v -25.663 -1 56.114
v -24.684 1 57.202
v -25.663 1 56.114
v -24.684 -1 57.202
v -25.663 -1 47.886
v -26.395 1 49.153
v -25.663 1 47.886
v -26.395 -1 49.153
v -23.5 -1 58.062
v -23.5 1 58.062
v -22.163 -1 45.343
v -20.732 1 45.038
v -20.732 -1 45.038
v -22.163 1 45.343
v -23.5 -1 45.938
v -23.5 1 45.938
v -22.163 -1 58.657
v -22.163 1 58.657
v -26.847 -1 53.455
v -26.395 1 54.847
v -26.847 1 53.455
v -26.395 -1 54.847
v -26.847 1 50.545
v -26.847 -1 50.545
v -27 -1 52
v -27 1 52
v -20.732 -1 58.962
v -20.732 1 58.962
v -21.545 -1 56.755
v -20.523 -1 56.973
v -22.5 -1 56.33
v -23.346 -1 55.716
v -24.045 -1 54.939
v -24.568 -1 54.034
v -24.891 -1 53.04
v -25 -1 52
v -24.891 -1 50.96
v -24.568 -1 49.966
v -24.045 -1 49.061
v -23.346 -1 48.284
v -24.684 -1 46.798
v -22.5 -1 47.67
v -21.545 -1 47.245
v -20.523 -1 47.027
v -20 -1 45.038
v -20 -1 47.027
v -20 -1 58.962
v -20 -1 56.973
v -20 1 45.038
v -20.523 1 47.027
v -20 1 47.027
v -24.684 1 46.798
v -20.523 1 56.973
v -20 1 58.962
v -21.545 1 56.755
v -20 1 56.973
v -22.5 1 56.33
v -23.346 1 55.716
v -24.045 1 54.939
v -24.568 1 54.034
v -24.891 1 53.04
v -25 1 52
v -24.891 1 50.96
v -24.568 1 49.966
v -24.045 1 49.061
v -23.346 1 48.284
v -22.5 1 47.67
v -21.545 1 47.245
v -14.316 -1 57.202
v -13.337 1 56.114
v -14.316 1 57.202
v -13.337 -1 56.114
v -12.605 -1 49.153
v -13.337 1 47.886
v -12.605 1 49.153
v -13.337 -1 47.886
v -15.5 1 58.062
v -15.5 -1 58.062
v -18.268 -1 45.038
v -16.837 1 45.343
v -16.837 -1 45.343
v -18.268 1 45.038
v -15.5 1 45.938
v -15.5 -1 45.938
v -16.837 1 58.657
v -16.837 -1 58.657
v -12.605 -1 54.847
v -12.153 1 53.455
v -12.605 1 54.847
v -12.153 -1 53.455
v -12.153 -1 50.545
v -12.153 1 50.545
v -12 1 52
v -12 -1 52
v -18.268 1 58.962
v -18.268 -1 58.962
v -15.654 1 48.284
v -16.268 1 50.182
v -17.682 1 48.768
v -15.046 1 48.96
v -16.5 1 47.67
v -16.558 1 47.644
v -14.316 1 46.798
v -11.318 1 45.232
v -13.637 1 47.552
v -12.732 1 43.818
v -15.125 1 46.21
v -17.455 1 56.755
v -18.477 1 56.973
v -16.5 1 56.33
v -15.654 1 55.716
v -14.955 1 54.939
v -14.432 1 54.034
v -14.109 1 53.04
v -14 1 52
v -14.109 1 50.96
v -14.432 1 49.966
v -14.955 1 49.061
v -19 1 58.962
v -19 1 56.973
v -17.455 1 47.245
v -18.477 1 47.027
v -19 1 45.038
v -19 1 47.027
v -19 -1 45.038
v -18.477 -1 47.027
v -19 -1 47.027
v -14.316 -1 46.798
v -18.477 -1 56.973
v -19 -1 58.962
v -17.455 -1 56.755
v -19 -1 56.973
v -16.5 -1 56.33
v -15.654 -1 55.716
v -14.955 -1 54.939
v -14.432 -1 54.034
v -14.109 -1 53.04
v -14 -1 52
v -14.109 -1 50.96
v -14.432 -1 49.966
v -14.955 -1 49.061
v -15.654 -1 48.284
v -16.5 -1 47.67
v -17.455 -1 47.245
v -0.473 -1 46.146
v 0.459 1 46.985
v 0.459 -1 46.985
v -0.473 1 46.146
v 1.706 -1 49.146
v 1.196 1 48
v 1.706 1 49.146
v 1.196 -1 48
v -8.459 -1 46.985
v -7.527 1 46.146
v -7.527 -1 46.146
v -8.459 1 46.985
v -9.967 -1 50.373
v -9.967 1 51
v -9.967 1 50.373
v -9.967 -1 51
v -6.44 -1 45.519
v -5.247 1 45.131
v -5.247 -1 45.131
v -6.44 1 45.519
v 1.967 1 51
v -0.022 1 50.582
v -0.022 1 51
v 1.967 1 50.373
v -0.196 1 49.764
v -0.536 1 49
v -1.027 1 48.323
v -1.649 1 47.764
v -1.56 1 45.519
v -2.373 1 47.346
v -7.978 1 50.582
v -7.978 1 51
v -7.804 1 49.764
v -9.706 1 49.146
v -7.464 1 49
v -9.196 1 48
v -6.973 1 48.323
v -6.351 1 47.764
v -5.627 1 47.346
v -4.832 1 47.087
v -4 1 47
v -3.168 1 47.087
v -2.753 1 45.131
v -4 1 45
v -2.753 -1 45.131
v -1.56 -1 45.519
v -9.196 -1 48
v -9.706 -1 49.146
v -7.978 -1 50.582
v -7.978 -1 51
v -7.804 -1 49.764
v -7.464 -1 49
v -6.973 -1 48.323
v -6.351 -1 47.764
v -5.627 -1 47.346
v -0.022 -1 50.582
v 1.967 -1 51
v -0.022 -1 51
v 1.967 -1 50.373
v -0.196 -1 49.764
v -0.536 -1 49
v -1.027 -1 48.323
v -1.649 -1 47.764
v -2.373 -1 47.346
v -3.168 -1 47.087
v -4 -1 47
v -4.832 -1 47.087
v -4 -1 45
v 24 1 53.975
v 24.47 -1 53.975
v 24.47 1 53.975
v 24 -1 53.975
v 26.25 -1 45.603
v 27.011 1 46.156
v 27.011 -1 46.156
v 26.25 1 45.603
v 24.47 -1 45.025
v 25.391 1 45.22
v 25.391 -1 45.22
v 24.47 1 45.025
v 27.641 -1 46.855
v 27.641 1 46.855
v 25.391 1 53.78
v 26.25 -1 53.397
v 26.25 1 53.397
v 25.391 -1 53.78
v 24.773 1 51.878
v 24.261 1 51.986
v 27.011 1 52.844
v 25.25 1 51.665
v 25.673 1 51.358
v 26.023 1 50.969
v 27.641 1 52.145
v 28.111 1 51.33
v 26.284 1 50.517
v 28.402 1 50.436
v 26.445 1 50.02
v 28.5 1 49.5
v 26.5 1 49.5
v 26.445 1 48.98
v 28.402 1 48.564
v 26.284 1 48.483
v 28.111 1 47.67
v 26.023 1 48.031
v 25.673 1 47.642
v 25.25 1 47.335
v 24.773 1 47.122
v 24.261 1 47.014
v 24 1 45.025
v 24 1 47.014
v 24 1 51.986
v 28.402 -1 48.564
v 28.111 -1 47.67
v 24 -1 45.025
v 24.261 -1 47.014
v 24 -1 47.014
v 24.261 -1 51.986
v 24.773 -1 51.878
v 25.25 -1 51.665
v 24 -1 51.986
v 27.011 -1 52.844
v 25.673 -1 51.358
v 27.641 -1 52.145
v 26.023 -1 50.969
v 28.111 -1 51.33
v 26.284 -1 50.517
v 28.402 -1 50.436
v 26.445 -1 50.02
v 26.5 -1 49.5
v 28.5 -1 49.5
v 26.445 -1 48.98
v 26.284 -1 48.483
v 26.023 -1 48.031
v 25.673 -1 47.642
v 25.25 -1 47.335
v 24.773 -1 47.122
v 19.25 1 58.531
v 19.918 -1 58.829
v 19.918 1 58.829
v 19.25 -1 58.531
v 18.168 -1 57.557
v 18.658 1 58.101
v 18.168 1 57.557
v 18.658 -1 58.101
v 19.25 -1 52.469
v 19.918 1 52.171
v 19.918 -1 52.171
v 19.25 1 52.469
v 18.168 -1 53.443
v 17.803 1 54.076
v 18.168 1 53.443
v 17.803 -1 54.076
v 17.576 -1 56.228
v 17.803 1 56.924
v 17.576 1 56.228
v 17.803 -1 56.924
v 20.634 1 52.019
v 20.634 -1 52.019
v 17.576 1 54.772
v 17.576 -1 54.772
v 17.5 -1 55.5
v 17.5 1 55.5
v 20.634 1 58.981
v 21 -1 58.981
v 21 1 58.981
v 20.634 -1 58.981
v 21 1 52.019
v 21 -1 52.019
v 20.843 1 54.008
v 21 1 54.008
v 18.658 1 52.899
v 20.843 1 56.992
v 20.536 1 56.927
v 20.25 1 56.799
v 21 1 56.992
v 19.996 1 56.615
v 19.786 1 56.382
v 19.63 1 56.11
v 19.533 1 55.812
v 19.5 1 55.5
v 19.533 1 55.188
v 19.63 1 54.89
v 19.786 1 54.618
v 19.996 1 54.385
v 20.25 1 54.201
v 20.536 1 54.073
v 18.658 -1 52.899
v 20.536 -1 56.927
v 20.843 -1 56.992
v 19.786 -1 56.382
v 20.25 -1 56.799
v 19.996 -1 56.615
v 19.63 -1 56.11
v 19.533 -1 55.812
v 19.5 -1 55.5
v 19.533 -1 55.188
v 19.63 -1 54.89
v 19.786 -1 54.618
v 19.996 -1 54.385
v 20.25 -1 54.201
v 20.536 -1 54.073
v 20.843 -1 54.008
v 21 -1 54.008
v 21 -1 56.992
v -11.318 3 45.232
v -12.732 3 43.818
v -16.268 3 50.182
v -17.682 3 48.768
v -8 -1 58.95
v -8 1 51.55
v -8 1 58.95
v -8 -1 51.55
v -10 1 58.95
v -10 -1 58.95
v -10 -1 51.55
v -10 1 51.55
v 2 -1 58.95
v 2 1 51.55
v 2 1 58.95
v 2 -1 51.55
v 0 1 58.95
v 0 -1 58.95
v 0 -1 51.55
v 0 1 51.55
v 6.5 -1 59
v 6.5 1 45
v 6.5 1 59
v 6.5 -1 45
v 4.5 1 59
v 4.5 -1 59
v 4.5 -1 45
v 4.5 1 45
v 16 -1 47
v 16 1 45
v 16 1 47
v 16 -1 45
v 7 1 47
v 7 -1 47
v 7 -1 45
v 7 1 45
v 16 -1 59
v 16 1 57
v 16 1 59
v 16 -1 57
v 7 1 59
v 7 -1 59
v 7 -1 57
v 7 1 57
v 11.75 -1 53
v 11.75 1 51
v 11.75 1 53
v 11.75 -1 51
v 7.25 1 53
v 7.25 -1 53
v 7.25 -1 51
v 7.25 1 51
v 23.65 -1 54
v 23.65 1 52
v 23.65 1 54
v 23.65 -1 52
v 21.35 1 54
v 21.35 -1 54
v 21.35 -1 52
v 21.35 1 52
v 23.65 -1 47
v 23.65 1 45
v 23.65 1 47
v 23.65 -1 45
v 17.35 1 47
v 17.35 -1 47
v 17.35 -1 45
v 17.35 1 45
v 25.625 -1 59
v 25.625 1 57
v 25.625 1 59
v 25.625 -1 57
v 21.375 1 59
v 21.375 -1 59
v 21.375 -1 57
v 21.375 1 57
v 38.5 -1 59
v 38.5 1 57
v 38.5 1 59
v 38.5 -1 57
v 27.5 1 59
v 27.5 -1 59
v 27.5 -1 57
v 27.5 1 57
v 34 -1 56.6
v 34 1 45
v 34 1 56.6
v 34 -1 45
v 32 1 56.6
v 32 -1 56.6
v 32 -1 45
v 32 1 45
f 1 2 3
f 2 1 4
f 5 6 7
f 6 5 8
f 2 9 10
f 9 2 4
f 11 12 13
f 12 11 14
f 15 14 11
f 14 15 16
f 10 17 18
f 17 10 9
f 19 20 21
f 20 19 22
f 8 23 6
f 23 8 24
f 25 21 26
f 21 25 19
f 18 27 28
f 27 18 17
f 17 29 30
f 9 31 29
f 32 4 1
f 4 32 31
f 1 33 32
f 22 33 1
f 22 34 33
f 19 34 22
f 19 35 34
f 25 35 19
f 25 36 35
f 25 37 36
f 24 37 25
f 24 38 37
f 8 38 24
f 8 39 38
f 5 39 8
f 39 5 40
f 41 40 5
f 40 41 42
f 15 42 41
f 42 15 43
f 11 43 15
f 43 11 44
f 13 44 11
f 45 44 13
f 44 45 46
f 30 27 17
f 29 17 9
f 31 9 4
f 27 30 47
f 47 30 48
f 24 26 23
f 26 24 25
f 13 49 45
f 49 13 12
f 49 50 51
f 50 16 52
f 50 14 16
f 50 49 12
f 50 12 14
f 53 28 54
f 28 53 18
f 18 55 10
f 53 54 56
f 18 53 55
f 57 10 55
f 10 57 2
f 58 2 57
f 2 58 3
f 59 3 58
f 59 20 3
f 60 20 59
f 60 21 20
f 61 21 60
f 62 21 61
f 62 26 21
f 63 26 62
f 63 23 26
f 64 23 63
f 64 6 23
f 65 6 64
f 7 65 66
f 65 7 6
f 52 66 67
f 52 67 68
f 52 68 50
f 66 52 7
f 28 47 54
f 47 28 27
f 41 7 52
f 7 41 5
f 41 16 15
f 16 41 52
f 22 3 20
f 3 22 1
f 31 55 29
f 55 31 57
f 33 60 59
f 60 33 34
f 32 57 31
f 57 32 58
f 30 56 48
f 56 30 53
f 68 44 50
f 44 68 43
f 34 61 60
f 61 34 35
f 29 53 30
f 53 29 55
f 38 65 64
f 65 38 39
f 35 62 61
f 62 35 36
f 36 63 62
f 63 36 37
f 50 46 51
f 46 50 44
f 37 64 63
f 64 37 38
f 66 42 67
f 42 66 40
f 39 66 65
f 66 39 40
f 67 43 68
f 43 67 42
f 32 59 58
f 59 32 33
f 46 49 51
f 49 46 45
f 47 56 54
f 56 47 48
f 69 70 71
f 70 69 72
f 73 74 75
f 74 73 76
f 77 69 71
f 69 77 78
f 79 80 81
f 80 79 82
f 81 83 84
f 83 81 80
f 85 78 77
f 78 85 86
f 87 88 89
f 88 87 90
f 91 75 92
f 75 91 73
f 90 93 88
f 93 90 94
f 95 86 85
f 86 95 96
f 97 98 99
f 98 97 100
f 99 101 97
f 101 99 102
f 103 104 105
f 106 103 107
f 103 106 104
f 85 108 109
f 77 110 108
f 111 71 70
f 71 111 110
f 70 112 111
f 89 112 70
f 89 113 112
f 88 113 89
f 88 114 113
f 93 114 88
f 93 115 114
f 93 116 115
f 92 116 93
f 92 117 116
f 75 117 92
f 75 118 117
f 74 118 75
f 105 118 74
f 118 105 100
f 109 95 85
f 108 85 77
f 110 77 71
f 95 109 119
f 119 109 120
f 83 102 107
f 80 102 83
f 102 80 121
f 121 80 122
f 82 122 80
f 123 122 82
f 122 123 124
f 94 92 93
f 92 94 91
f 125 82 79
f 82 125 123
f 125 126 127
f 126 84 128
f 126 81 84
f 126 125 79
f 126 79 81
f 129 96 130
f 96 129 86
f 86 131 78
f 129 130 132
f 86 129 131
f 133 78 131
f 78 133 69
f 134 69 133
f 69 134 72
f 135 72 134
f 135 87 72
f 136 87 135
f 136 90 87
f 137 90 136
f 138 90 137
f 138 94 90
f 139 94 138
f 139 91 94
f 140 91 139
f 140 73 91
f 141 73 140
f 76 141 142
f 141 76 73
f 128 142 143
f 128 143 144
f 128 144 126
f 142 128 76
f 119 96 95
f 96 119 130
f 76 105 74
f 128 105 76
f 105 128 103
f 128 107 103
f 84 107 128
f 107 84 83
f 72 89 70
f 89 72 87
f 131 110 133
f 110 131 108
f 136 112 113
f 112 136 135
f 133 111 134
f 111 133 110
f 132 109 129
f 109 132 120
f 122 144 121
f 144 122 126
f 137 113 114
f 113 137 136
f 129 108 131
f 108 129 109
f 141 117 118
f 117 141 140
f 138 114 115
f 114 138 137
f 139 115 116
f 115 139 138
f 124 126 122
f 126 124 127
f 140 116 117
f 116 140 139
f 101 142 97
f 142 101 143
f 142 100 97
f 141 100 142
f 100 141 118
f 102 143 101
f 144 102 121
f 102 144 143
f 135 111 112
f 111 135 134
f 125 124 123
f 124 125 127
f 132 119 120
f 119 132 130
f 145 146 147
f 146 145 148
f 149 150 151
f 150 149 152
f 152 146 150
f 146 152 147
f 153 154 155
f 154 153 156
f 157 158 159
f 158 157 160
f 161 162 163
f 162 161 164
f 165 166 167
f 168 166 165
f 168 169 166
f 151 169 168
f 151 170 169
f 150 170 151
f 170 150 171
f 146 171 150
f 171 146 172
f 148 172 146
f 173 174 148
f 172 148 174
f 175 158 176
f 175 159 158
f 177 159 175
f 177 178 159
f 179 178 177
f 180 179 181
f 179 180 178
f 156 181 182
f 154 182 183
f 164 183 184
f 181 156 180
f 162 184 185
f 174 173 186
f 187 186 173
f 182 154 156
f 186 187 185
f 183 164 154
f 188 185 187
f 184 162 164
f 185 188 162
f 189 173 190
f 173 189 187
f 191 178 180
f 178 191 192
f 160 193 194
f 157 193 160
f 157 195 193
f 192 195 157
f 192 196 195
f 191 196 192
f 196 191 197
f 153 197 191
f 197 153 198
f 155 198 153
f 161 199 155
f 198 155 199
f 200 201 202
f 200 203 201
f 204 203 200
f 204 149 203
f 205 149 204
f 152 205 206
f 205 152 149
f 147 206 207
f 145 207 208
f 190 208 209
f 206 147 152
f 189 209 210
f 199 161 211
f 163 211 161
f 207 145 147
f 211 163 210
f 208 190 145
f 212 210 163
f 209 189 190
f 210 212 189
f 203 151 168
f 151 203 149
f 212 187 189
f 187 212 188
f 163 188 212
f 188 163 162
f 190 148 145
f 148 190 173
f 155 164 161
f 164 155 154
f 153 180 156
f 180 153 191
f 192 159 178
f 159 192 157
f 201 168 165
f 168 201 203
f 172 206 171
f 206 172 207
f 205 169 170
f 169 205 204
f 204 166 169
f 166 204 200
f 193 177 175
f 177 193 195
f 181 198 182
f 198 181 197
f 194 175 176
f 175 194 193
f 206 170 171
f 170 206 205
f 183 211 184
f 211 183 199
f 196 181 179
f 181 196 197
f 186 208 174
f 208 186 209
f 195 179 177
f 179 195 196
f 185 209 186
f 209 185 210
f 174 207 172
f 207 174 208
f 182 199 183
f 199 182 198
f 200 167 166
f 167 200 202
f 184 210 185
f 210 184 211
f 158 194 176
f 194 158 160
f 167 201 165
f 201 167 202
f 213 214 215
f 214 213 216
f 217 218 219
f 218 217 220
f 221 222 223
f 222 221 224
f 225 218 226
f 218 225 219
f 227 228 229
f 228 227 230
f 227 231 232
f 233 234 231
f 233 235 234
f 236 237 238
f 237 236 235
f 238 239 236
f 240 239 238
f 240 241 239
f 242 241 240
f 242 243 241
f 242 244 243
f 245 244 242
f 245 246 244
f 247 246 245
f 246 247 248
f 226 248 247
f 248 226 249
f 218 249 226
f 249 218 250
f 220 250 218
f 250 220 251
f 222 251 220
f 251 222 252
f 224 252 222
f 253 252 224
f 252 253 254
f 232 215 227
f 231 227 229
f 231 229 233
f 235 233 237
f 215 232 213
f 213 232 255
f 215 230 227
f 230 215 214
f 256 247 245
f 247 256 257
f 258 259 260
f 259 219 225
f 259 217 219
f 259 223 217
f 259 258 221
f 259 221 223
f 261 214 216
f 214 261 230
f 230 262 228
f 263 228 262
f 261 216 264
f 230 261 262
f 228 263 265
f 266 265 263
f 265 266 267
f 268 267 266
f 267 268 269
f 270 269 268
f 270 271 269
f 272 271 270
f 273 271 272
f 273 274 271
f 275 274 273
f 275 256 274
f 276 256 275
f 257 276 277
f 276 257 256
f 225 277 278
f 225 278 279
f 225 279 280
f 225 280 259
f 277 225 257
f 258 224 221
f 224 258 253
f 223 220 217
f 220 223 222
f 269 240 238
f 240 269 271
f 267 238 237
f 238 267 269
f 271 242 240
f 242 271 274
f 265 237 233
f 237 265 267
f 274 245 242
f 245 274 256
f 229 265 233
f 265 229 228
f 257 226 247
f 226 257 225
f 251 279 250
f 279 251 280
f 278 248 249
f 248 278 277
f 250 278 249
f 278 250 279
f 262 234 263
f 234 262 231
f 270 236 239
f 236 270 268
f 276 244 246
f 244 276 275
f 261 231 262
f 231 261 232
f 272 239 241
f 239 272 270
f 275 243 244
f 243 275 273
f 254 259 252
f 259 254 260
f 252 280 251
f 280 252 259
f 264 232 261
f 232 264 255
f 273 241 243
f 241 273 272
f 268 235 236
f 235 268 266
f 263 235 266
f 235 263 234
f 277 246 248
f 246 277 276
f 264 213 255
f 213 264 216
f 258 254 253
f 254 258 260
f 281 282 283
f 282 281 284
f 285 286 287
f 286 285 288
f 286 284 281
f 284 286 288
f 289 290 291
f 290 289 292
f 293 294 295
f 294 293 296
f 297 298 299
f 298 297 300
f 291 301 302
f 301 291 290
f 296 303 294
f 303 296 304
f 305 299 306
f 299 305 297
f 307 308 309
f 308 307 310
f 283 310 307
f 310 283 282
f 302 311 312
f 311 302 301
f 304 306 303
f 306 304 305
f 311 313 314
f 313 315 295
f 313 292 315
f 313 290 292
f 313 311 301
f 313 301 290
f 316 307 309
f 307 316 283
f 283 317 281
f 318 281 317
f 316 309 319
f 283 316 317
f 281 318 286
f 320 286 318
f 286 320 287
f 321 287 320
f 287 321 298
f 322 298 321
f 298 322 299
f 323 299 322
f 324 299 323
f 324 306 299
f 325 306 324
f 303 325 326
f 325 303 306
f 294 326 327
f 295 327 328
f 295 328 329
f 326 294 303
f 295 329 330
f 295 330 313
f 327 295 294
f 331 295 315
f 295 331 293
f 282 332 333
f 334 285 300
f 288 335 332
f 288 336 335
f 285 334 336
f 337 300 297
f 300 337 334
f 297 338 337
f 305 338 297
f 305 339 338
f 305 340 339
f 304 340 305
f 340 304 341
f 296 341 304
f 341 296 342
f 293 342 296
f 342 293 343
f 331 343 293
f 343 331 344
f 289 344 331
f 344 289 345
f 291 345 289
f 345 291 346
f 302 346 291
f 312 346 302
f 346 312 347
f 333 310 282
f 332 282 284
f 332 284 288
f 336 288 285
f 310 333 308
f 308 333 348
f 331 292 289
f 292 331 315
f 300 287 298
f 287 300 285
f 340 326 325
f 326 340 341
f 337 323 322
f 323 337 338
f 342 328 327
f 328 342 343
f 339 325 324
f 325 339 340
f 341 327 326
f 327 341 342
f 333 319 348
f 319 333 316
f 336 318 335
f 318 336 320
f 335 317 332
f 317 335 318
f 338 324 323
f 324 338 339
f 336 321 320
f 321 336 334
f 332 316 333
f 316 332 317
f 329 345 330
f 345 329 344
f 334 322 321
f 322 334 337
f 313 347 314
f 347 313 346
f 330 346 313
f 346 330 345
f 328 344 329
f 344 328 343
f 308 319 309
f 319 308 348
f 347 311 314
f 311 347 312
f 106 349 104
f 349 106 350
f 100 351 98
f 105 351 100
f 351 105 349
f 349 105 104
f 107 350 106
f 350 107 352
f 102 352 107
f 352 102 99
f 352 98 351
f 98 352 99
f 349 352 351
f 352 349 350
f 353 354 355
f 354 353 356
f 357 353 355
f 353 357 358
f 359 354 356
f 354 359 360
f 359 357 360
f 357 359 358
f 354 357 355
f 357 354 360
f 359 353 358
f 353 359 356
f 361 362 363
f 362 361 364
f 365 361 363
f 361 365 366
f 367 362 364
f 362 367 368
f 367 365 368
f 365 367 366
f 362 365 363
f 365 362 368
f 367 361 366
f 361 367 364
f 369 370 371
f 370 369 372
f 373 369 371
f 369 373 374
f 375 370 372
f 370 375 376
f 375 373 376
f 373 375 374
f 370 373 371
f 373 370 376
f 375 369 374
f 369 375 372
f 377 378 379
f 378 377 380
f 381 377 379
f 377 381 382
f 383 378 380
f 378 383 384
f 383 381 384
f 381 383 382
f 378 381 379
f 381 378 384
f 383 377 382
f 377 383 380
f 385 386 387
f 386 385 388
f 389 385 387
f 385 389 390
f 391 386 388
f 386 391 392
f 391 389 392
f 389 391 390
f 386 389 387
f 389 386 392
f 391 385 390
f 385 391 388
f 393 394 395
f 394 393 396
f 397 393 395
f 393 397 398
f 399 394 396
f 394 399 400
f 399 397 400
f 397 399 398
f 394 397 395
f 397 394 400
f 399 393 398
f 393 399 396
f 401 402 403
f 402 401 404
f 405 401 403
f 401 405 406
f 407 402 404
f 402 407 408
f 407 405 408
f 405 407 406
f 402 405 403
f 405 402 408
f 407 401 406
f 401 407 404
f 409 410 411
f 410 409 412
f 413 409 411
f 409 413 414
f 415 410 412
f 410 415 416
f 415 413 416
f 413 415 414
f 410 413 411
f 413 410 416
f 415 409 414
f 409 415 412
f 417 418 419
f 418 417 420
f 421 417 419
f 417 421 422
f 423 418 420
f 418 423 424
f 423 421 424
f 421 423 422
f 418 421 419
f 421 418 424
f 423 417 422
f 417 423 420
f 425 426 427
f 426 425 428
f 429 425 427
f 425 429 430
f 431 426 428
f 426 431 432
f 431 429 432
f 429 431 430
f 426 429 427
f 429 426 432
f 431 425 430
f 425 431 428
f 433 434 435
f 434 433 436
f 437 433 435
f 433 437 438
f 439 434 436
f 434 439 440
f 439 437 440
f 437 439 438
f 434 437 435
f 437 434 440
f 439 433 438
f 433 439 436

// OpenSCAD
translate([0,0,30])
{
color("#E0D44A")
{
translate([-20,0,22])
rotate([90,0,0])
semicircle(7,2);
translate([-19,0,22])
rotate([90,0,180])
semicircle(7,2);
translate([-14.5,2,17])
rotate([0,45,0])
cube([7,2,2],center=true);
translate([-4,0,21])
rotate([90,-90,0])
semicircle(6,2);
translate([-9,0,25.25])
cube([2,2,7.4],center=true);
translate([1,0,25.25])
cube([2,2,7.4],center=true);
translate([5.5,0,22])
cube([2,2,14],center=true);
translate([11.5,0,16])
cube([9,2,2],center=true);
translate([11.5,0,28])
cube([9,2,2],center=true);
translate([9.5,0,22])
cube([4.5,2,2],center=true);
translate([24,0,19.5])
rotate([90,180,0])
semicircle(4.5,2);
translate([21,0,25.5])
rotate([90,0,0])
semicircle(3.5,2);
translate([22.5,0,23])
cube([2.3,2,2],center=true);
translate([20.5,0,16])
cube([6.3,2,2],center=true);
translate([23.5,0,28])
cube([4.25,2,2],center=true);
translate([33,0,28])
cube([11,2,2],center=true);
translate([33,0,20.8])
cube([2,2,11.6],center=true);
}

color("DarkOrange",(0.8))
translate([-18,0,1])
rotate([90,0,0])
scale([0.4,0.3,0.4])
union(){
text("A Long Ray's Journey",font="Times New Roman");
translate([30,-14,0])
text("Into Light",font="Times New Roman");
}
}




module semicircle(radius=4,height=1) {
    
difference() {
    cylinder(height, radius, radius, $fn=30,center=true);
    cylinder(height+0.2, radius-2, radius-2, $fn=30,center=true);
    translate([radius,0,0])
    cube([(radius*2),(radius*2),height+1],center=true);
}
}
